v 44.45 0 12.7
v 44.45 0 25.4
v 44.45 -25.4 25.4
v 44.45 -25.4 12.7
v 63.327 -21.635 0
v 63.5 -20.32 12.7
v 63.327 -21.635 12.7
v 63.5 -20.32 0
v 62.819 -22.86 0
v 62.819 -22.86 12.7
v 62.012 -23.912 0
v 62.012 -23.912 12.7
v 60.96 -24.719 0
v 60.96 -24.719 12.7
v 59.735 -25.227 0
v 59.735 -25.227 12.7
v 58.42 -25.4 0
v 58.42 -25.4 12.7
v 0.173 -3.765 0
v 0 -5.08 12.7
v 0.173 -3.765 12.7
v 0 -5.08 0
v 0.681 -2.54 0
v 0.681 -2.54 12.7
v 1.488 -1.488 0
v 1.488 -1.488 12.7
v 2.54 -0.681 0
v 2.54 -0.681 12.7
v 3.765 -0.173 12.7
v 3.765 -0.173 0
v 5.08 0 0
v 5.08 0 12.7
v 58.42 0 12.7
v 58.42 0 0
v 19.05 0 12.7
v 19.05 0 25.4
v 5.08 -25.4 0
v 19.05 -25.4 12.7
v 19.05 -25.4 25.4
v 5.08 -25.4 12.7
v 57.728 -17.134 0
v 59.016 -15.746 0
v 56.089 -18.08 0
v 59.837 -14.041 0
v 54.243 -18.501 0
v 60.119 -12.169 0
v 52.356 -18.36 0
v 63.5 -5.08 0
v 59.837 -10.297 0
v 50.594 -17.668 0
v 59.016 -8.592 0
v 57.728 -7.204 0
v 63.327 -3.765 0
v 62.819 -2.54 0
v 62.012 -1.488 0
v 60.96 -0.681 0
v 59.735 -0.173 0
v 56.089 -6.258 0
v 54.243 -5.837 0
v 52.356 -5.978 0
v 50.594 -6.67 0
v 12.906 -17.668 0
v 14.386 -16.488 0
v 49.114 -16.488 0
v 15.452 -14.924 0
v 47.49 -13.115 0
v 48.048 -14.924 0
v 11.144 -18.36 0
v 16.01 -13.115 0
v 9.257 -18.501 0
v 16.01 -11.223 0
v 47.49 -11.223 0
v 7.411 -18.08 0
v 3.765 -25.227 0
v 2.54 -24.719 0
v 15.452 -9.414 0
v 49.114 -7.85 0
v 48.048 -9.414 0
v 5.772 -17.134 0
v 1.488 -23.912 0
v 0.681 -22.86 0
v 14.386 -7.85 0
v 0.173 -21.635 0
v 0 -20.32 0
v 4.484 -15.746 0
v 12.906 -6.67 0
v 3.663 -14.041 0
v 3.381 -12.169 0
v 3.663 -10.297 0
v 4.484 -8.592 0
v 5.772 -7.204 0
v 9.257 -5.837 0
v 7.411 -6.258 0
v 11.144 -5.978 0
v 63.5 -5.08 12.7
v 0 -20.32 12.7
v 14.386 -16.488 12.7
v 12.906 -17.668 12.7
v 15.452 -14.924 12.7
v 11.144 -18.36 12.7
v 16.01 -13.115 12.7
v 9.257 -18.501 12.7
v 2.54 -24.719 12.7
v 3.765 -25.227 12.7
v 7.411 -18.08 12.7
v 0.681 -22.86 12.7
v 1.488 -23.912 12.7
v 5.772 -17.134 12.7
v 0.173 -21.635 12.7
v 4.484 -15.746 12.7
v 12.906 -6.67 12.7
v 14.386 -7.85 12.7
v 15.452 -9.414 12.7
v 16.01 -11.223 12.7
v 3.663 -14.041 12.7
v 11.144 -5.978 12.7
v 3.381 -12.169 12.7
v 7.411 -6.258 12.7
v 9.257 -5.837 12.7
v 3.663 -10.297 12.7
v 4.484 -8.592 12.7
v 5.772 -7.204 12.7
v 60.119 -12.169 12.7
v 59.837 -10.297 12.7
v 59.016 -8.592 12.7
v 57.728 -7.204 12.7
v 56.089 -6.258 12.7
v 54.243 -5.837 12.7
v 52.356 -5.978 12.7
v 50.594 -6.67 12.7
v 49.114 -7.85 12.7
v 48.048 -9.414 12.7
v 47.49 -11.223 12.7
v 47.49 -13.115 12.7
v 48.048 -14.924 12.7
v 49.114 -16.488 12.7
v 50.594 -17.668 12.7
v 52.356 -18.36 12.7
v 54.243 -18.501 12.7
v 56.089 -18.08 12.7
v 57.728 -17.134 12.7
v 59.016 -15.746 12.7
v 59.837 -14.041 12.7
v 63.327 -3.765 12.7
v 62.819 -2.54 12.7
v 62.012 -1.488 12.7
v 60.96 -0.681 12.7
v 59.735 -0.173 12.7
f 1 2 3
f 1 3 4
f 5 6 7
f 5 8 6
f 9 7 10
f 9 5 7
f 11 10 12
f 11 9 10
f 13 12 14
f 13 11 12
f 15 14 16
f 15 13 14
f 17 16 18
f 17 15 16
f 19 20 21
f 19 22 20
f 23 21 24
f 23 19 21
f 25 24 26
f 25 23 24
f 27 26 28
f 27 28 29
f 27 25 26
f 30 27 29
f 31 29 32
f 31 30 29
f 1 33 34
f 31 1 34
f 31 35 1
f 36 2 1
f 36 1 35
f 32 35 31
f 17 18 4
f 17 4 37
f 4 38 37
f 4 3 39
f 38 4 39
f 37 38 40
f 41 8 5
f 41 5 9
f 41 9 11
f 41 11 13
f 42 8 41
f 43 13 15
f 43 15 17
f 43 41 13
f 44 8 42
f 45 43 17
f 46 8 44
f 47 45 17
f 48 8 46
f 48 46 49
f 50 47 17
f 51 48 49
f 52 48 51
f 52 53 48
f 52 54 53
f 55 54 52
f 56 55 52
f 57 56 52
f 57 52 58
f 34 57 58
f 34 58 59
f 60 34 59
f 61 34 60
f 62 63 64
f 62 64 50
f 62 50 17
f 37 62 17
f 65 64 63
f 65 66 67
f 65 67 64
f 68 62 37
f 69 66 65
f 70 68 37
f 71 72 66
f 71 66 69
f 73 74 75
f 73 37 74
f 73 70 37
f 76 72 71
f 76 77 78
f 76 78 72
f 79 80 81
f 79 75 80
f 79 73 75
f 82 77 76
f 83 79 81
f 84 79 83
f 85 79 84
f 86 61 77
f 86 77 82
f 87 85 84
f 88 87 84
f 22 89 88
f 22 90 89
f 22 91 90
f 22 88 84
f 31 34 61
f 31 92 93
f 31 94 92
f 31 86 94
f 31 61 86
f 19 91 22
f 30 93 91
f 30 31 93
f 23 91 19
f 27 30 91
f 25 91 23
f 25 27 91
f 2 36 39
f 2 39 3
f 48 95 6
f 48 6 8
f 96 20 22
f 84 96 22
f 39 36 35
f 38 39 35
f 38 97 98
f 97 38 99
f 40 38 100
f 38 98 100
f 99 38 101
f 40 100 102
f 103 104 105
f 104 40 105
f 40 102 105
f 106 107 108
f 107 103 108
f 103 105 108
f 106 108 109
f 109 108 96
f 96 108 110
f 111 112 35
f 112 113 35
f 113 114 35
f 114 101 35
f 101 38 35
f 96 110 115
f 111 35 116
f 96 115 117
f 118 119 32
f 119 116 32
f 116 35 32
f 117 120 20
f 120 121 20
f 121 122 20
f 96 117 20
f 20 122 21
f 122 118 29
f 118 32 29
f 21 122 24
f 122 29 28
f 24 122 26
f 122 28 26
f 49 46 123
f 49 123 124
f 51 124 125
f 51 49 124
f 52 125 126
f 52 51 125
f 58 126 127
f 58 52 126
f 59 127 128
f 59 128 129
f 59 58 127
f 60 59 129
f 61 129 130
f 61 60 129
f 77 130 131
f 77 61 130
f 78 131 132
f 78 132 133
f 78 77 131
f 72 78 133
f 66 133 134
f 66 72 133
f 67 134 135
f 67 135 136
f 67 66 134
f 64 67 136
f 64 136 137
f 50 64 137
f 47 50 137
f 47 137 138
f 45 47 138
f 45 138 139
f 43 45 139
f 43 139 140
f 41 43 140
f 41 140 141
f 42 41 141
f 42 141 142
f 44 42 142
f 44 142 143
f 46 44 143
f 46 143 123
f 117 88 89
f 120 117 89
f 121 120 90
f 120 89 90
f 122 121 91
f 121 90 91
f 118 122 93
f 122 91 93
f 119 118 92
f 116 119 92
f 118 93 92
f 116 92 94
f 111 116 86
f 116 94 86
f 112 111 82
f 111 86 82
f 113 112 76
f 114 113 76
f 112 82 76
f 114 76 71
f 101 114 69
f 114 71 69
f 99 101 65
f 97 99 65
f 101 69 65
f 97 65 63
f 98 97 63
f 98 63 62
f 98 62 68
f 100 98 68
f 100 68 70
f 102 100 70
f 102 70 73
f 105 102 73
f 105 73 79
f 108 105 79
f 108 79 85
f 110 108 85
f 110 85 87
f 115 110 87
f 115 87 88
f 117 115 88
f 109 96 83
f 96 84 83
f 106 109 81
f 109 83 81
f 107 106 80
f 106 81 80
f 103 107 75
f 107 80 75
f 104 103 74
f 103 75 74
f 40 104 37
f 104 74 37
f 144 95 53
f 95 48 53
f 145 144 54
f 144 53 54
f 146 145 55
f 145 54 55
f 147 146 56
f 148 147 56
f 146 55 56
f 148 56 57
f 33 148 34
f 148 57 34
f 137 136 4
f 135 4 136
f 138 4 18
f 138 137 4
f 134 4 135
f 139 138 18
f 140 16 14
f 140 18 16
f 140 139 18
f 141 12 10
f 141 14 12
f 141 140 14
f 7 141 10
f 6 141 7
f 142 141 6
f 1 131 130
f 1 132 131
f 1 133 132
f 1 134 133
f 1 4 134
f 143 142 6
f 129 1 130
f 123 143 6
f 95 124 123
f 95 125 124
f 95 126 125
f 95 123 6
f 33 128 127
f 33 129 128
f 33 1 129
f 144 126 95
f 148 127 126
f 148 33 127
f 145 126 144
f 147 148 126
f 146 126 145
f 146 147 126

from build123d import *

# Parameters (mm, degrees)
F1_DEPTH = 25.4
F2_R     = 5.08
F3_R     = 5.08
F5_D     = 12.7


with BuildPart() as f1:
    # F0 (on Front) → F1 (new body)
    with BuildSketch(Plane.XZ):
        Polygon((0, 12.7), (0, 0), (31.75, 0), (31.75, 25.4), (19.05, 25.4), (19.05, 12.7), align=None)
    extrude(amount=F1_DEPTH)

    # F2
    f2_edges = [f1.edges().sort_by_distance(p)[0] for p in [
        (0, -25.4, 6.35),
    ]]
    fillet(f2_edges, radius=F2_R)

    # F3
    f3_edges = [f1.edges().sort_by_distance(p)[0] for p in [
        (0, 0, 6.35),
    ]]
    fillet(f3_edges, radius=F3_R)

    # F5 (through all)
    with Locations(Plane.XY.offset(12.7)):
        with Locations((9.731116, -12.168982)):
            Hole(F5_D / 2)

    # F6: F1 across face


with BuildPart() as f1_1:
    add(f1.part)
    add(f1.part.mirror(Plane(origin=(31.75, -12.7, 12.7), x_dir=(0, 1, 0), z_dir=(1, 0, 0))))


solid = f1_1.part
